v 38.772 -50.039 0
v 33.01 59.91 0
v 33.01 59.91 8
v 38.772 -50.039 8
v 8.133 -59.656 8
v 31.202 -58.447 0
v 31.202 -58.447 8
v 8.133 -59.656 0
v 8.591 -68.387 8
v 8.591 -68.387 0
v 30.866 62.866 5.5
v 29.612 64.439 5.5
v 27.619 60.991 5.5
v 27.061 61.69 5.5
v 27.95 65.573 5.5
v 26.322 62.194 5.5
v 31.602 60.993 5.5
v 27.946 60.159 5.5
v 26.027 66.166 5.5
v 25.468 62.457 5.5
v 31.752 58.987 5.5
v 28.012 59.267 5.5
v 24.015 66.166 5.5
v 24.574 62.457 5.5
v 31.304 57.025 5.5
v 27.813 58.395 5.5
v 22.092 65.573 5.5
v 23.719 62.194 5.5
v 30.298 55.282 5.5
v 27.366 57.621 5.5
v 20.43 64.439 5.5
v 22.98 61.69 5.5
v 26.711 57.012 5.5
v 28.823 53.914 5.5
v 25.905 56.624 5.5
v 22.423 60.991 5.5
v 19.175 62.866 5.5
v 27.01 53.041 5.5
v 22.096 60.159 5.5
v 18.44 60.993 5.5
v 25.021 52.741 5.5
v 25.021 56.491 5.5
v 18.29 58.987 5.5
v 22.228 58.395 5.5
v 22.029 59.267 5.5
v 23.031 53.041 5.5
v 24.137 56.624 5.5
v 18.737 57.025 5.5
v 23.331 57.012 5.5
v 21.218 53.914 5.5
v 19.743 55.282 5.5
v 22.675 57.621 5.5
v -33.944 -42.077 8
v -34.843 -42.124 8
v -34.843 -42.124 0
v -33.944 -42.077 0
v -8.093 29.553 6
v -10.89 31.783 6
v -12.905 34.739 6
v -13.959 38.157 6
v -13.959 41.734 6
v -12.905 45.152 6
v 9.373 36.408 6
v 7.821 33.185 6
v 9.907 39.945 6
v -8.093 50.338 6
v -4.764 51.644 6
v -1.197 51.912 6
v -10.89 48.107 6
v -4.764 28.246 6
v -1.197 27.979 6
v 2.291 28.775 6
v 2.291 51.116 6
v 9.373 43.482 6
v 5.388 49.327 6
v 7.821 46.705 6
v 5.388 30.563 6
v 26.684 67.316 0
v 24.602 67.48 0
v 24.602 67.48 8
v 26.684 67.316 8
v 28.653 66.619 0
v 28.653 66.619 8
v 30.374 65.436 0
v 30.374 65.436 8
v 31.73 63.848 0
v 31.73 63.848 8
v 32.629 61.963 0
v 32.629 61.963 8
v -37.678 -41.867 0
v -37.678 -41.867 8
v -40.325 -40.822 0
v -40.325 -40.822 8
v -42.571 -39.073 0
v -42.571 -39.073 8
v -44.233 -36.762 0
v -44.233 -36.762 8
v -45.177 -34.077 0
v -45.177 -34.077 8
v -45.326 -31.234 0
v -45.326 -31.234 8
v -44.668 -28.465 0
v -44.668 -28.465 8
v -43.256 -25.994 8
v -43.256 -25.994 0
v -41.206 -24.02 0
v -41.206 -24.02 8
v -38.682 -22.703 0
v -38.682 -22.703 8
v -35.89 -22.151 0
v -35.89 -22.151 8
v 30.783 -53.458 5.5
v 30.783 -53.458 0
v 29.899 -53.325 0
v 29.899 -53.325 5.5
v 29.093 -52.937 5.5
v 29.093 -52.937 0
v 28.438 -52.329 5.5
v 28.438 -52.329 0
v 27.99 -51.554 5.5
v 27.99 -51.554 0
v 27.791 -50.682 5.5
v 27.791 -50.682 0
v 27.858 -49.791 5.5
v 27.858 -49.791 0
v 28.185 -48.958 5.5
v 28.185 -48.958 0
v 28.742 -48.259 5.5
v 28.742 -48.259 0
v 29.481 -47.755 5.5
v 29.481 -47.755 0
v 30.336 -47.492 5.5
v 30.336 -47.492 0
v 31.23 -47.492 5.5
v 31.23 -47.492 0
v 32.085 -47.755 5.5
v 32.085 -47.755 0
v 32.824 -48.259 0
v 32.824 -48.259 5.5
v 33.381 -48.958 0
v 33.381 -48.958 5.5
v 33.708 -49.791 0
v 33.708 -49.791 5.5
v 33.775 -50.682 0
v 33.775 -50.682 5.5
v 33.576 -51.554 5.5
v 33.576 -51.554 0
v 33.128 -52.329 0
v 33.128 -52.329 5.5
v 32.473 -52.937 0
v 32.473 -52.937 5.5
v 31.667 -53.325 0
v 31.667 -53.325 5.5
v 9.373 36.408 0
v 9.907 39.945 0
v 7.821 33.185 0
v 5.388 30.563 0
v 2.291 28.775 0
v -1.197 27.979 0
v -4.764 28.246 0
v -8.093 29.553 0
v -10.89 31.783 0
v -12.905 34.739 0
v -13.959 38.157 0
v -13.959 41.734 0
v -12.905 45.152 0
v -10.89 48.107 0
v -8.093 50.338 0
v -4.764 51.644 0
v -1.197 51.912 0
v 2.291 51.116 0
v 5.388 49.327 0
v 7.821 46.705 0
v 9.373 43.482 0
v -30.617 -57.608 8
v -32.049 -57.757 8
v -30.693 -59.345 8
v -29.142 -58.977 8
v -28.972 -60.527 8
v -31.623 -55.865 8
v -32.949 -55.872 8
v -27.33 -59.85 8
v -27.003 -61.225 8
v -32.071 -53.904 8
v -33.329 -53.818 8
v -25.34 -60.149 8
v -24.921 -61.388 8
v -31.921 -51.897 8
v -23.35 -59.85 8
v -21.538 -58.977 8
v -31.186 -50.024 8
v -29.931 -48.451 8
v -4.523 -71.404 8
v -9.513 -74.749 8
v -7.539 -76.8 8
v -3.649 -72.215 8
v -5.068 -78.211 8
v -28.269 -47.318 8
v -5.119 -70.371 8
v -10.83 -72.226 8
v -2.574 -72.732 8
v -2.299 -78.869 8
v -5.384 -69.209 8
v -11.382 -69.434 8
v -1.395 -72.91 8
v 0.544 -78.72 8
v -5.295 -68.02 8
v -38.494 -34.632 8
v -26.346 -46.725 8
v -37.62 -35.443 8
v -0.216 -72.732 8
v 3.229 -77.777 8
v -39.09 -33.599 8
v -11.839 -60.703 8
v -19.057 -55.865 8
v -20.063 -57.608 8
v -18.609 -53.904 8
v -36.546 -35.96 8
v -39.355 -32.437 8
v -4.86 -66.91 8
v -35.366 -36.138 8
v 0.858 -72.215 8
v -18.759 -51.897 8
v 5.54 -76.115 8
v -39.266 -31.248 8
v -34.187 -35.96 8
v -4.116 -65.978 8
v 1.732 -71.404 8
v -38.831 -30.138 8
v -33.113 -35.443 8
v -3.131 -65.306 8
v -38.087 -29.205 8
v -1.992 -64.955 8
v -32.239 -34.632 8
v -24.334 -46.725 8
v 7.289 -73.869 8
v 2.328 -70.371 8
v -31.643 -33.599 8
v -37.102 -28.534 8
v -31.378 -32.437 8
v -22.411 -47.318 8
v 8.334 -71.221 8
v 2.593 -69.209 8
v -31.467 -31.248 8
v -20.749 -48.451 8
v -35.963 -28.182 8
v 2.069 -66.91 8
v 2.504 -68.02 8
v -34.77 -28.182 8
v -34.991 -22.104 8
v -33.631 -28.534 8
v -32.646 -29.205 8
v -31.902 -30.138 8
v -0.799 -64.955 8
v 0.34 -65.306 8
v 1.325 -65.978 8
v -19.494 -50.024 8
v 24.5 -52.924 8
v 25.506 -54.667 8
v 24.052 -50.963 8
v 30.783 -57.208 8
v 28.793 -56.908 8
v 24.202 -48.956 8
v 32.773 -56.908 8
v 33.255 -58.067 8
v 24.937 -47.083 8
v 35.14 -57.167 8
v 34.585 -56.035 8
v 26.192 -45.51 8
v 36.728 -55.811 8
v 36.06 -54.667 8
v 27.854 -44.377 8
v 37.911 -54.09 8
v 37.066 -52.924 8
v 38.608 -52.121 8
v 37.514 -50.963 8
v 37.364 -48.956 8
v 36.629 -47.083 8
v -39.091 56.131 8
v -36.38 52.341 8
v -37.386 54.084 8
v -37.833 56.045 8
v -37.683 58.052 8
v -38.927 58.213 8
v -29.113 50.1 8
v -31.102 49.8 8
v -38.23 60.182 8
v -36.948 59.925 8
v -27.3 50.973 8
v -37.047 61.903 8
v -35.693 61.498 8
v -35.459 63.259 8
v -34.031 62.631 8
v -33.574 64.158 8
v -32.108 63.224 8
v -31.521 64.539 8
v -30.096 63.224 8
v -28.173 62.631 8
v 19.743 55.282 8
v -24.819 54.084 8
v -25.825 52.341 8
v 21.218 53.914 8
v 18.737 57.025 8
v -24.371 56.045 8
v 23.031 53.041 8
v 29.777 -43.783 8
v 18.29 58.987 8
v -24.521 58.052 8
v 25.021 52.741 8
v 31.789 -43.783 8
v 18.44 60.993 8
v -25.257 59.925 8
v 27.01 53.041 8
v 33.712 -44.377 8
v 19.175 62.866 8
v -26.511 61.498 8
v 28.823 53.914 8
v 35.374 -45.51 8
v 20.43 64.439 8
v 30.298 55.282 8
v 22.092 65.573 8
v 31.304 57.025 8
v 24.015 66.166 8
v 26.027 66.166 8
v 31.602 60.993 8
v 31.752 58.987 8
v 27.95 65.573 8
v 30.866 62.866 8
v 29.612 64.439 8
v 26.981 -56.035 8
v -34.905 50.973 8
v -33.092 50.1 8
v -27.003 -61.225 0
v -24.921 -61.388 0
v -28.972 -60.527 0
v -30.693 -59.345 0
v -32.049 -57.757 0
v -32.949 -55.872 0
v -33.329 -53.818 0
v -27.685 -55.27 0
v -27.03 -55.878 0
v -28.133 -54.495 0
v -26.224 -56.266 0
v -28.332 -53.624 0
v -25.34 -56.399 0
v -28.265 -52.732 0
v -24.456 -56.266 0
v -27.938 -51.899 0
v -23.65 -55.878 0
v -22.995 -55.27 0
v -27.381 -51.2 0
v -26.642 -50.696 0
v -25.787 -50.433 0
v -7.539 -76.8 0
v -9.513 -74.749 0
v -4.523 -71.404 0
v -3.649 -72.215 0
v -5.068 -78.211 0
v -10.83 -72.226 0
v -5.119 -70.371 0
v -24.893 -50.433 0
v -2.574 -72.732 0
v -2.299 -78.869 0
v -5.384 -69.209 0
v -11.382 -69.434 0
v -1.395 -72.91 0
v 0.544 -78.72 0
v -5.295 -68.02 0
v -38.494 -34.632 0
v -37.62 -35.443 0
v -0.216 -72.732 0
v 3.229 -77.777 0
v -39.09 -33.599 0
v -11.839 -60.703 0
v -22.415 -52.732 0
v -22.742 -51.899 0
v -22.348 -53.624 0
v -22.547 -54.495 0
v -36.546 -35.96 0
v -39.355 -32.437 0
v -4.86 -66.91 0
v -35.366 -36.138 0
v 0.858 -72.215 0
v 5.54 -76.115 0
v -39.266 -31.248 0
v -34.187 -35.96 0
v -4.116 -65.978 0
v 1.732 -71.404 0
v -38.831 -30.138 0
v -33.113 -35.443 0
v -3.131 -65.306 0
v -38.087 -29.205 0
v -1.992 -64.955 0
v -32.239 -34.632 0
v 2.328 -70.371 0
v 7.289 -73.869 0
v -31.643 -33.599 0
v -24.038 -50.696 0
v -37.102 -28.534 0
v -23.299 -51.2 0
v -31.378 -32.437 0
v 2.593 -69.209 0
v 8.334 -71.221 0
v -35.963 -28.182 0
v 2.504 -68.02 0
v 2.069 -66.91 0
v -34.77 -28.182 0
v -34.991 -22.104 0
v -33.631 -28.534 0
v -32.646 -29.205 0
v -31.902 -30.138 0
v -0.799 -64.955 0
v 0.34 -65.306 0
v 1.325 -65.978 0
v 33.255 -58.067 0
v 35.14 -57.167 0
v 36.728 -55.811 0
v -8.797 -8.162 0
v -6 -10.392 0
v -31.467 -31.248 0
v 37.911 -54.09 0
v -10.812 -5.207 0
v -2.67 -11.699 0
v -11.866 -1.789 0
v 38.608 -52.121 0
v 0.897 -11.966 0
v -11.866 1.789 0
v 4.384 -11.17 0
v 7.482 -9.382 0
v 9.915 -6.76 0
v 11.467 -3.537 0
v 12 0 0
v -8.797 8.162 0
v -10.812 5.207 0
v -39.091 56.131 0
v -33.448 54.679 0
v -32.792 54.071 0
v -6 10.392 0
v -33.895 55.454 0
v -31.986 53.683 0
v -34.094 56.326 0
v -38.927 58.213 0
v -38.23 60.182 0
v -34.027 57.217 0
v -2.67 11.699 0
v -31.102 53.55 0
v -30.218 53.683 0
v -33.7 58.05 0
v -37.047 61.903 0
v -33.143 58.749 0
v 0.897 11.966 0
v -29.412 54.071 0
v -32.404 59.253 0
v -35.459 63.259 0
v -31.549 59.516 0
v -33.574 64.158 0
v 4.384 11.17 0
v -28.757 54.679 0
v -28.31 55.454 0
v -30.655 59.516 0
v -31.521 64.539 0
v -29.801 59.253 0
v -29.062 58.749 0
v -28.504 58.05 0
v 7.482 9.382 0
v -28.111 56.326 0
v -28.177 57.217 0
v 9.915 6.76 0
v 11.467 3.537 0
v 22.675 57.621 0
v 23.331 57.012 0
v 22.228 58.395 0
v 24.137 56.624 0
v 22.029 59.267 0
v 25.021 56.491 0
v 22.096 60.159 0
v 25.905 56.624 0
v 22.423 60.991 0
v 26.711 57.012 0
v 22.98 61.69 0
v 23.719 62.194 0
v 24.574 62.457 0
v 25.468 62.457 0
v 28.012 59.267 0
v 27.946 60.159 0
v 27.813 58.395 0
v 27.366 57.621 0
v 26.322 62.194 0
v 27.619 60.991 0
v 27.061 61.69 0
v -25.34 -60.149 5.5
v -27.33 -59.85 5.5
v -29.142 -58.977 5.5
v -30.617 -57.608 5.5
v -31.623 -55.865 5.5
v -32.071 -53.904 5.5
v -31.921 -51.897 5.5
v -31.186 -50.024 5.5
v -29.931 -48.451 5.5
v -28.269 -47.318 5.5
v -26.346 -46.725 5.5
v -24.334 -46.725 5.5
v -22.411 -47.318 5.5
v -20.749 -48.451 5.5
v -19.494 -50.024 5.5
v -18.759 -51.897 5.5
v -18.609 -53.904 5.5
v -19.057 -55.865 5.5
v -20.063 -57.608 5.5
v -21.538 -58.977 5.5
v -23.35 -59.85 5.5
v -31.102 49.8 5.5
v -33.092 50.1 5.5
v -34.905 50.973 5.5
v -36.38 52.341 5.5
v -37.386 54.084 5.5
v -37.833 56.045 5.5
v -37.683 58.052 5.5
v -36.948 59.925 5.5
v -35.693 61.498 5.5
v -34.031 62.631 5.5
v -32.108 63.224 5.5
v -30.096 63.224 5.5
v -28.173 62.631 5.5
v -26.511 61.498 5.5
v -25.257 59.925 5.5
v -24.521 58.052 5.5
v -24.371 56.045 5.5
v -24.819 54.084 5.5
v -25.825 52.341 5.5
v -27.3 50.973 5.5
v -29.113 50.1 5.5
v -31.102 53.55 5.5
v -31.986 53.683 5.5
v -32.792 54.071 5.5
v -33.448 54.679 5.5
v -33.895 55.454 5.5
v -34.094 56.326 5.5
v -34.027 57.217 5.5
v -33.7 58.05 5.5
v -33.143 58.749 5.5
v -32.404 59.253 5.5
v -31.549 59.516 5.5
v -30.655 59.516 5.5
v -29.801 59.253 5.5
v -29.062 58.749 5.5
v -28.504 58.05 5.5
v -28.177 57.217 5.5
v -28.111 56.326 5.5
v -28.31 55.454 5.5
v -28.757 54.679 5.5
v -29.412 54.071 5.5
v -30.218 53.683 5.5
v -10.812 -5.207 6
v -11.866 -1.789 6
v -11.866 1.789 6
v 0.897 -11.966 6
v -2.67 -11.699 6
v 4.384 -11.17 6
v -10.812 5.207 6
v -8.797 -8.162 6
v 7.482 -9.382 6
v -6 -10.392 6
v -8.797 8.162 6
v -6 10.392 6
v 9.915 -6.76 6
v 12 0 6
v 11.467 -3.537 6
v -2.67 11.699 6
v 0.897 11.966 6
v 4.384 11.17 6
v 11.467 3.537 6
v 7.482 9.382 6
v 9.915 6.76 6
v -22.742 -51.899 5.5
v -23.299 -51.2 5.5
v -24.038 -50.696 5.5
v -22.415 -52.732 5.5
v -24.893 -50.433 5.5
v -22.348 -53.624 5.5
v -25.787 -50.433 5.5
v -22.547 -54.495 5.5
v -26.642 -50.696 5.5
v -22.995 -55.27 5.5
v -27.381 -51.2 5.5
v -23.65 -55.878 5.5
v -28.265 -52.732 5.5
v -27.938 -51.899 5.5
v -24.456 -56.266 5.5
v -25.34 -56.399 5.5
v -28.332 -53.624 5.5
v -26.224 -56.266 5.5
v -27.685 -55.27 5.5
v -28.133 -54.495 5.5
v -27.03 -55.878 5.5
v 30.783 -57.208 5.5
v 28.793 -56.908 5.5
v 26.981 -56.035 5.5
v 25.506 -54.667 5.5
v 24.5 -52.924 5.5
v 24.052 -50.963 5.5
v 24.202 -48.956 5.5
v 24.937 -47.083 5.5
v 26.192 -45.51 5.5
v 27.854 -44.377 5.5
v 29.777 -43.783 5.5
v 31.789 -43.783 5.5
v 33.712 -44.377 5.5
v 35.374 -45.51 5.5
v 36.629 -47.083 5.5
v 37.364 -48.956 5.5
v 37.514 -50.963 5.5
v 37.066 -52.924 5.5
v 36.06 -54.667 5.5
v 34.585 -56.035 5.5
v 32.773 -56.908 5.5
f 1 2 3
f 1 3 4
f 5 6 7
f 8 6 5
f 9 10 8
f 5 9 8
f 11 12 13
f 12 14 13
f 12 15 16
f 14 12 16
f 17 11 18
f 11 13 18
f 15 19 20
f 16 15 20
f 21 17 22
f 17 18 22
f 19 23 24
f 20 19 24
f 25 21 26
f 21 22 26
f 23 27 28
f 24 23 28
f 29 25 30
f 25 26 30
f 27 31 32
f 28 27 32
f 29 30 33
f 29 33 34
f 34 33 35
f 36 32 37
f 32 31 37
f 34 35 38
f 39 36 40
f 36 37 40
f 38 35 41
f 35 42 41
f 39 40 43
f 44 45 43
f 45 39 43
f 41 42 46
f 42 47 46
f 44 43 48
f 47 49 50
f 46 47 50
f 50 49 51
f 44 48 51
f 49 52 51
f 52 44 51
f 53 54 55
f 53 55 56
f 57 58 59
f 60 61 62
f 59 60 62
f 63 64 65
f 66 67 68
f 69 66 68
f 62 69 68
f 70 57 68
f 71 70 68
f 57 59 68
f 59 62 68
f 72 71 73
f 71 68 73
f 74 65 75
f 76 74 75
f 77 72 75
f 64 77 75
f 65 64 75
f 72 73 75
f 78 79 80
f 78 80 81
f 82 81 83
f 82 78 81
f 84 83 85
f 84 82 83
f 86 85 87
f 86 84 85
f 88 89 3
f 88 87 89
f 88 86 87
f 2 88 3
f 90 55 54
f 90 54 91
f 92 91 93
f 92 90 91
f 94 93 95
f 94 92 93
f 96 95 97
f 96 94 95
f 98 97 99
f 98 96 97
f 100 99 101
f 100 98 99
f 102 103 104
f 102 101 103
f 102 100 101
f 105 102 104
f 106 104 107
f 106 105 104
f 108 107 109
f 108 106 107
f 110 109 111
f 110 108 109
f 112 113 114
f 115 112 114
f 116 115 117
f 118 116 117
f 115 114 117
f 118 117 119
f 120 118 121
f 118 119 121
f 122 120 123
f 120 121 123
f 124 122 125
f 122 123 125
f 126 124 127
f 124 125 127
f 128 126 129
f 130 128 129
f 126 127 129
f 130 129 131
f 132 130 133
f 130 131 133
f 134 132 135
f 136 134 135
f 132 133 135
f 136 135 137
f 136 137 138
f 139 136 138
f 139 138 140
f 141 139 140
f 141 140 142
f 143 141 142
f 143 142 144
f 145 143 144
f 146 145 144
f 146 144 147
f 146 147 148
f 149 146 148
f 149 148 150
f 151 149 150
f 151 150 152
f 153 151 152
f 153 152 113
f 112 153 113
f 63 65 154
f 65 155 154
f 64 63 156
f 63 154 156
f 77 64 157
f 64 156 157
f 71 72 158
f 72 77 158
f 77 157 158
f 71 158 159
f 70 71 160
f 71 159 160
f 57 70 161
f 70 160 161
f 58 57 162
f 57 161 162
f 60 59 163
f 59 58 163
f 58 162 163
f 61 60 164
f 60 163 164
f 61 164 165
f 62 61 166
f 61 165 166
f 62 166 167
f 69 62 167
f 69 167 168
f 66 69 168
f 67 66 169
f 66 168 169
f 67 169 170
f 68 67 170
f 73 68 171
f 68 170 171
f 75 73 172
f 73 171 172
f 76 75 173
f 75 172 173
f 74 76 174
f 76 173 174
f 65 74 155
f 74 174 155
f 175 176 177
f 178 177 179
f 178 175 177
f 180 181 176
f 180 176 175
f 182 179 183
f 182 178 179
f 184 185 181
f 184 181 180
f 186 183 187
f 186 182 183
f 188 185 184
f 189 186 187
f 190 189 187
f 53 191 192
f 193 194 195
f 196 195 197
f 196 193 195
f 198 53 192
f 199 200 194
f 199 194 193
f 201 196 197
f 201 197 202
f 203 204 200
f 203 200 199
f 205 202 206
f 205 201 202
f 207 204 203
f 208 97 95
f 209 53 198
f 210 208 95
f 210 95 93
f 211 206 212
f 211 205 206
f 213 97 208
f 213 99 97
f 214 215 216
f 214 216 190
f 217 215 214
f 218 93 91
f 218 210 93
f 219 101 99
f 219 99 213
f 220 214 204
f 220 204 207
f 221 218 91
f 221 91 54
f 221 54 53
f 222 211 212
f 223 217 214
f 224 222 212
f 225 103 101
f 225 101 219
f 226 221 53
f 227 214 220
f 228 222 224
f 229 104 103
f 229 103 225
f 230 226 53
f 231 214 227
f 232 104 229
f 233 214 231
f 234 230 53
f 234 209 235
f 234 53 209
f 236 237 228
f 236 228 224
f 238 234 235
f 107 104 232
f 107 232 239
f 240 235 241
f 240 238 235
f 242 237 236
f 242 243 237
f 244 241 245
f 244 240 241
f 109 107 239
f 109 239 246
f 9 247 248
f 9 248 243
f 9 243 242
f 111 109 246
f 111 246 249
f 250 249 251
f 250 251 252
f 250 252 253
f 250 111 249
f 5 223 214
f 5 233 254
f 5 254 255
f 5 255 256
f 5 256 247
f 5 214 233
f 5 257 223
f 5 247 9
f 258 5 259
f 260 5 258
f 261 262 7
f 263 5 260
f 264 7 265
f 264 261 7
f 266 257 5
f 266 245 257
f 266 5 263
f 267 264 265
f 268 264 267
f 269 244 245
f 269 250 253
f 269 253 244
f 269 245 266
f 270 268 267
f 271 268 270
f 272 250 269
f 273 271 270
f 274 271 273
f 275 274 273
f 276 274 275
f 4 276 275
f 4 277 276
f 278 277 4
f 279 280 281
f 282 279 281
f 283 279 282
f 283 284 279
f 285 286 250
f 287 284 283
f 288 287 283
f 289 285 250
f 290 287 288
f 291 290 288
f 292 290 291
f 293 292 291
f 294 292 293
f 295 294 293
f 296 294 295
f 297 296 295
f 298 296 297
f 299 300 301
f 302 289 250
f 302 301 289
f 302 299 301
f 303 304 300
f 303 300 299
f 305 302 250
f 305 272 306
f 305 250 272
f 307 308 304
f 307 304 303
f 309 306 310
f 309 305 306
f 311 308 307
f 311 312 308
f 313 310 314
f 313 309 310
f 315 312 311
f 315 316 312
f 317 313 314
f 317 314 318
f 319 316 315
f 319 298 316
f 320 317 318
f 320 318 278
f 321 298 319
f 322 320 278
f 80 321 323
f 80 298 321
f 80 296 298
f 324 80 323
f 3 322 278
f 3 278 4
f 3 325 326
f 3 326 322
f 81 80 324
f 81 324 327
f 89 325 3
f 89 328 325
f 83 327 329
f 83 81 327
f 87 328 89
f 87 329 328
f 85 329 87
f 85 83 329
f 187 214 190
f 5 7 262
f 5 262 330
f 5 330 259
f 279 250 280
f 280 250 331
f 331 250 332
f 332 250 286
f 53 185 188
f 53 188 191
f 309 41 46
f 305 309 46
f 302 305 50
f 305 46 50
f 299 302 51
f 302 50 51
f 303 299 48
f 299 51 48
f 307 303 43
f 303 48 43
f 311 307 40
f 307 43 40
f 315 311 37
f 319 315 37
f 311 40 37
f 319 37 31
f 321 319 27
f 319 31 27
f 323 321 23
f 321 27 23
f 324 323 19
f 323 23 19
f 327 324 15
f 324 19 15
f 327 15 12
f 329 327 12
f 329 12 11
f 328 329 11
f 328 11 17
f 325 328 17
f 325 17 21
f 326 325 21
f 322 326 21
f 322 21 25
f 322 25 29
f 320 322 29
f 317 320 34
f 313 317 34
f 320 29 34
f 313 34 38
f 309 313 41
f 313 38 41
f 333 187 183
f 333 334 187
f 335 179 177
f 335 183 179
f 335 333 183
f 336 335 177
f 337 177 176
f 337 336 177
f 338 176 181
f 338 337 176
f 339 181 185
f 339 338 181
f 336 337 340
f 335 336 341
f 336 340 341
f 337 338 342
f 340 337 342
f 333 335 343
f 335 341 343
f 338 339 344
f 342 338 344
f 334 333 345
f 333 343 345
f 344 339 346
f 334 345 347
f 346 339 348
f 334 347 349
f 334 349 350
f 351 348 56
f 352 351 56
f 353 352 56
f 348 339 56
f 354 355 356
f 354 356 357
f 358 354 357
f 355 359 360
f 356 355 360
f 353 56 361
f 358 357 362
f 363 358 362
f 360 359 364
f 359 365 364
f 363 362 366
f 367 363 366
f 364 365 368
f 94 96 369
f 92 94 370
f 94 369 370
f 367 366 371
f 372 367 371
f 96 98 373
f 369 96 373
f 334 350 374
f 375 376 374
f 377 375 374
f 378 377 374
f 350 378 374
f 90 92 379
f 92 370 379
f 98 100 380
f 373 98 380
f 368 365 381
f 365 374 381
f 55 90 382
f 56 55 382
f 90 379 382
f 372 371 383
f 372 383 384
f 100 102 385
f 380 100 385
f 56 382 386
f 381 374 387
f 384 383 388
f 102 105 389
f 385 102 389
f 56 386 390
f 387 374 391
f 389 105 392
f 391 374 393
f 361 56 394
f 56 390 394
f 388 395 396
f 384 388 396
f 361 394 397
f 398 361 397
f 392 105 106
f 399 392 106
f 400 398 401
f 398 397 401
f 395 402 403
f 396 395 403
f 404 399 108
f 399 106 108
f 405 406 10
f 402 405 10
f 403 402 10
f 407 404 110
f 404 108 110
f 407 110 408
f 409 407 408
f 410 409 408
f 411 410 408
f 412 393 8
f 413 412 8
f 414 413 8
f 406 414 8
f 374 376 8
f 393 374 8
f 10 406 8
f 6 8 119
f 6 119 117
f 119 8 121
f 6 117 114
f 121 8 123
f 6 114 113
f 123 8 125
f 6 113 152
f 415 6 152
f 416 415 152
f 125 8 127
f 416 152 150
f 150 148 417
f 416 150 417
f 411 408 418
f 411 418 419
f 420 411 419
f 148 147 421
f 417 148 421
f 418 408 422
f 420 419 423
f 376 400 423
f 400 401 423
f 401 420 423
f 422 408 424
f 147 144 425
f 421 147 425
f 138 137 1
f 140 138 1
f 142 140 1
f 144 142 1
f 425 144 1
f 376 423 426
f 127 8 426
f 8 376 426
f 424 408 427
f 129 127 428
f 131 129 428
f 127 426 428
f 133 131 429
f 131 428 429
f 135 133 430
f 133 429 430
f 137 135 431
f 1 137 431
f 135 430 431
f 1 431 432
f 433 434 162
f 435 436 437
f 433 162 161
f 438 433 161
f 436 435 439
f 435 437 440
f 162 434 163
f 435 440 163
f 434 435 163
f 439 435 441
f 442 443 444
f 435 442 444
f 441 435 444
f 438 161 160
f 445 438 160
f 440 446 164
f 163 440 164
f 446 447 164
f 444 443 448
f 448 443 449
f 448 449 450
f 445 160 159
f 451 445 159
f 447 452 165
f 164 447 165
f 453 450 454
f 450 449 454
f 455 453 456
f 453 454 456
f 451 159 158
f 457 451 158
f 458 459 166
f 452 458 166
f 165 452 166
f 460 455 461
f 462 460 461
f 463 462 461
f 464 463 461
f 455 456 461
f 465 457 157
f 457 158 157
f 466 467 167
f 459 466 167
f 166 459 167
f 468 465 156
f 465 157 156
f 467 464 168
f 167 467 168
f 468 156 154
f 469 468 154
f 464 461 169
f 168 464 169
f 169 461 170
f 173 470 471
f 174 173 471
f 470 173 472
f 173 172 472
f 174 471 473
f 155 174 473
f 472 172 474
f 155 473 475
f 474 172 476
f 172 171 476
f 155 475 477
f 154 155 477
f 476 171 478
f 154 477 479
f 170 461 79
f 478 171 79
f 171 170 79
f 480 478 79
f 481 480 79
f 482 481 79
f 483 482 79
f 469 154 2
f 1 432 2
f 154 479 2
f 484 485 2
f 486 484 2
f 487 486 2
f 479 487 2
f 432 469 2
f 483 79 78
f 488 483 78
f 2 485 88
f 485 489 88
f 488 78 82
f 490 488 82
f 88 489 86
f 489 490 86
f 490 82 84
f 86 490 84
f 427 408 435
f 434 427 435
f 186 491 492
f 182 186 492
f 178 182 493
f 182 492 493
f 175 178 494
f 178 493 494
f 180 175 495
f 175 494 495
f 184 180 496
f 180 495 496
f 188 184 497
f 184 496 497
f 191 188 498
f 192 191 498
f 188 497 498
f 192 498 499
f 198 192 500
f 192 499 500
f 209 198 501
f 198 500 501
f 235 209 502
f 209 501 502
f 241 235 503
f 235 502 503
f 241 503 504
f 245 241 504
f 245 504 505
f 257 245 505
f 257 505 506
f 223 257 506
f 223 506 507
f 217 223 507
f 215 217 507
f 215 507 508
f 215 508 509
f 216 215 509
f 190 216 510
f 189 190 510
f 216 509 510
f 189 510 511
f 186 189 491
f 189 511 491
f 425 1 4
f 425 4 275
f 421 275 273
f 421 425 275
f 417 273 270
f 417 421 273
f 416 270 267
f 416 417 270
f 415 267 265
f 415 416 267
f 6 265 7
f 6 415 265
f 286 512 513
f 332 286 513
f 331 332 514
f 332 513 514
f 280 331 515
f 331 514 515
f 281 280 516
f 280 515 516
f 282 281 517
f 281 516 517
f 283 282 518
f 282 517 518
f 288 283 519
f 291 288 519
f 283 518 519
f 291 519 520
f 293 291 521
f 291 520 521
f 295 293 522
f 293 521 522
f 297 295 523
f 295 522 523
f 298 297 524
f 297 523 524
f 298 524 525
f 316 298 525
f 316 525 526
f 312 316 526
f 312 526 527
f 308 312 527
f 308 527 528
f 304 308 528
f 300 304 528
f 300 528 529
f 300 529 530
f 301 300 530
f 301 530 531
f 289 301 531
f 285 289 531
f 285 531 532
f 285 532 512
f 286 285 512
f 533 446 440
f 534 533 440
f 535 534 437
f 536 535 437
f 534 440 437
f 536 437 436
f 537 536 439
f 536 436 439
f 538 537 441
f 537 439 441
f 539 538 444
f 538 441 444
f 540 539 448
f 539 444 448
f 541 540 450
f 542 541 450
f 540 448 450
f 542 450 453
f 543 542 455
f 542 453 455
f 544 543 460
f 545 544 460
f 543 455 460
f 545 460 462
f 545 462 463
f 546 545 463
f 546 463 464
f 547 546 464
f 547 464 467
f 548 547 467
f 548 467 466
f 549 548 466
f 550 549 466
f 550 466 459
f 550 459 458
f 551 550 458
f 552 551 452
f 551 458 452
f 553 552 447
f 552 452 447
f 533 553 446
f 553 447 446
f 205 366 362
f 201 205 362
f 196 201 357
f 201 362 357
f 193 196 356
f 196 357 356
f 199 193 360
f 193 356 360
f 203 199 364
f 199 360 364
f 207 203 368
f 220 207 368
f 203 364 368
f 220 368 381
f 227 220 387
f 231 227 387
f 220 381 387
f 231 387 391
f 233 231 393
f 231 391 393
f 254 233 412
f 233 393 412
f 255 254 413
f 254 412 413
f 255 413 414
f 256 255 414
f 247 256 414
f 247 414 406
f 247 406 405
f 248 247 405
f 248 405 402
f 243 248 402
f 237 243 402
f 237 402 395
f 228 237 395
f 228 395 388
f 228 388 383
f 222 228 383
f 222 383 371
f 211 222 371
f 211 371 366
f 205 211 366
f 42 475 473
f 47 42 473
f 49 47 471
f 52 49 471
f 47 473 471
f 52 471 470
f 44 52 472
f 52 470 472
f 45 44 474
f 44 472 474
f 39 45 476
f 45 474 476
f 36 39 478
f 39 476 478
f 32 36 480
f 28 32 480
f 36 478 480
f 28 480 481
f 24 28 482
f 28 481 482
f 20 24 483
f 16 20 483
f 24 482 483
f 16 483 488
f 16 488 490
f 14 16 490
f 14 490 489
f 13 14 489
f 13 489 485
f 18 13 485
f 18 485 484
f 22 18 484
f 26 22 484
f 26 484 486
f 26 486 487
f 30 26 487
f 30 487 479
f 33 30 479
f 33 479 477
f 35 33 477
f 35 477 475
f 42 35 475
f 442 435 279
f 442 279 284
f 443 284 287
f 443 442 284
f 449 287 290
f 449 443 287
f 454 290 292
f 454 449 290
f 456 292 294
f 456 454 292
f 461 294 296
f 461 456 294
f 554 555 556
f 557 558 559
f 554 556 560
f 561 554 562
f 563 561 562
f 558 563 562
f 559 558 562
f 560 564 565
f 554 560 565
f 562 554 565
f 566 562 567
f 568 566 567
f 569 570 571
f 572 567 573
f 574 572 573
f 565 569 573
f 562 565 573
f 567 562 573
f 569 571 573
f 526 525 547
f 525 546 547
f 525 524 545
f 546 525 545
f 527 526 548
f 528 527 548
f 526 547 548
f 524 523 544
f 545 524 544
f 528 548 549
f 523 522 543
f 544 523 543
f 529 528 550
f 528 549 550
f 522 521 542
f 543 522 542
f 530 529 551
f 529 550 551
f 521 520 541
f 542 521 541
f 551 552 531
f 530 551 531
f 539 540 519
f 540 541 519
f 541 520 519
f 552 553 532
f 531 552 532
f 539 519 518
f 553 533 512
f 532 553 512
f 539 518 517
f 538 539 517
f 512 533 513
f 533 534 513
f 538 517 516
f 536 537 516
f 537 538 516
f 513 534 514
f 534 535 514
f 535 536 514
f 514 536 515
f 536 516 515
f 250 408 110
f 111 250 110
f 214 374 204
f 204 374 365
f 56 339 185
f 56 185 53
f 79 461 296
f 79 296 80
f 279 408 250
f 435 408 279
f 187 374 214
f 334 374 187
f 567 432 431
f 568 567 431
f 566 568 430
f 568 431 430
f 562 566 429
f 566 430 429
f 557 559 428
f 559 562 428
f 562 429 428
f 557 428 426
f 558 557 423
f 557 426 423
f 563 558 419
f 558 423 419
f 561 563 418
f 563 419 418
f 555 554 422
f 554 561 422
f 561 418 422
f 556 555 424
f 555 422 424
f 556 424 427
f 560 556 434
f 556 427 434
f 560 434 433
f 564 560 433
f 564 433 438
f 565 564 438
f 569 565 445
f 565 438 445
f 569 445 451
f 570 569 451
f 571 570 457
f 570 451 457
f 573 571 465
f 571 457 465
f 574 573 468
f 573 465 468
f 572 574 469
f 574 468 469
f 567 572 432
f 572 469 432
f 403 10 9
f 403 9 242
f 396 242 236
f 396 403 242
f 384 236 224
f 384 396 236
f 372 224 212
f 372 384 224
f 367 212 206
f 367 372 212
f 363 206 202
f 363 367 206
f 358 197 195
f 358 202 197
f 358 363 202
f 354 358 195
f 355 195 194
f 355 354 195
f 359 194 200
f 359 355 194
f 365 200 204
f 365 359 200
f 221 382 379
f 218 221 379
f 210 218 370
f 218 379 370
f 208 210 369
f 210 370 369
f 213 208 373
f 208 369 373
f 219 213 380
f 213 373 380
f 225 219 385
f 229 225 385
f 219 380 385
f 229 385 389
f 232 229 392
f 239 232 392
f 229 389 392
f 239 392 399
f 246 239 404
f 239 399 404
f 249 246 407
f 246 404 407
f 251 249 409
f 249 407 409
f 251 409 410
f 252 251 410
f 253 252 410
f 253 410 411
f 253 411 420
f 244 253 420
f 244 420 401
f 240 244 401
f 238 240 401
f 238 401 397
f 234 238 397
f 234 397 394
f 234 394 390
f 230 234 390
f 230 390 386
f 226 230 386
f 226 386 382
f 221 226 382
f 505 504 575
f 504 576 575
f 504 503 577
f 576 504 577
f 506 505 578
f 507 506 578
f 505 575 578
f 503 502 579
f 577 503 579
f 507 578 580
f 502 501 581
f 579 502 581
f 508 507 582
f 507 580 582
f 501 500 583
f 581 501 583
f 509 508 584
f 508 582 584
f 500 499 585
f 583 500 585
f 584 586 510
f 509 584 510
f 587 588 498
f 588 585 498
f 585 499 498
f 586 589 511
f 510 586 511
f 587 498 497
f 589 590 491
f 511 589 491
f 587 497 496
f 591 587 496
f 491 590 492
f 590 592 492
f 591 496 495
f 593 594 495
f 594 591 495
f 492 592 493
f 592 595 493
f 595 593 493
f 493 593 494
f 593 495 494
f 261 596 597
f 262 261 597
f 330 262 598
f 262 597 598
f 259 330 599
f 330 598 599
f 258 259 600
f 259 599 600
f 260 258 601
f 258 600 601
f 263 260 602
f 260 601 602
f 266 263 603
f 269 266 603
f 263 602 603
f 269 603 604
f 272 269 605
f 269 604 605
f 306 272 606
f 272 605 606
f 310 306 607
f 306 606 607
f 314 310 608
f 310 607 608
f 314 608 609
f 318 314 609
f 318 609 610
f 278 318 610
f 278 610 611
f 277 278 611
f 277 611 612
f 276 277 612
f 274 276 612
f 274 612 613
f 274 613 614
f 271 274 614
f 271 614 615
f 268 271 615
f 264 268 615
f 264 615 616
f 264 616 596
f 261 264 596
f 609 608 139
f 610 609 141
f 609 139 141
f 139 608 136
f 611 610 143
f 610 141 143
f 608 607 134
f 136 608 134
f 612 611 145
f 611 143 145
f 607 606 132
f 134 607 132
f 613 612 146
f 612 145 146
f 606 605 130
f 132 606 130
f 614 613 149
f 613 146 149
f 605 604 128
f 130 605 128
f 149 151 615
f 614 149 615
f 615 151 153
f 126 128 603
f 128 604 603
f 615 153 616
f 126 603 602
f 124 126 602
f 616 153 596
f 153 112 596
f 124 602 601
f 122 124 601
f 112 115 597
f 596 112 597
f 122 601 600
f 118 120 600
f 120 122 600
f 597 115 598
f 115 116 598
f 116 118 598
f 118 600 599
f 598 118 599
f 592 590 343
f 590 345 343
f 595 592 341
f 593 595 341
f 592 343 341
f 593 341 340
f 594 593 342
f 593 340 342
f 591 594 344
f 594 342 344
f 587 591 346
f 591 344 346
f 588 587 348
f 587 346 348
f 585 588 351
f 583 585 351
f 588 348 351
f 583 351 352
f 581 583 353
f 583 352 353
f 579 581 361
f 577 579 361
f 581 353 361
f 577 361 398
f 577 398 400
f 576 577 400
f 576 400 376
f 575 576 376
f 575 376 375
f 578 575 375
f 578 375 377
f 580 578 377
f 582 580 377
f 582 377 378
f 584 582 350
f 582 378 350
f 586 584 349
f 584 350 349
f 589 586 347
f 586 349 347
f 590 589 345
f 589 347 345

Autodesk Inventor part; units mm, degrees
ref_plane "YZ Plane" through (0, 0, 0) normal (1, 0, 0) x (0, 1, 0)
ref_plane "XZ Plane" through (0, 0, 0) normal (0, 1, 0) x (-1, 0, 0)
ref_plane "XY Plane" through (0, 0, 0) normal (0, 0, 1) x (1, 0, 0)
sketch "Эскиз1" plane through (0, 0, 0) normal (0, 0, 1) x (1, 0, 0)
  arc A0 (31.2016, -58.4471) -> (38.772, -50.0394) centre (30.783, -50.4581) ccw projected
  line L0 (31.2016, -58.4471) -> (8.1333, -59.6561) projected
  line L1 (33.0098, 59.9097) -> (38.772, -50.0394) projected
  arc A1 (33.0098, 59.9097) -> (24.6021, 67.4801) centre (25.0208, 59.491) ccw projected
  circle A2 centre (-2.0934, 39.9452) radius 12 projected
  circle A3 centre (0, 0) radius 12 projected
  line L2 (-34.9911, -22.1042) -> (-39.0912, 56.131) projected
  arc A4 (-35.8899, -22.1513) -> (-34.8432, -42.1239) centre (-35.3665, -32.1376) ccw projected
  line L3 (-34.9911, -22.1042) -> (-35.8899, -22.1513) projected
  line L4 (-34.8432, -42.1239) -> (-33.9444, -42.0768) projected
  line L5 (-33.3291, -53.8181) -> (-33.9444, -42.0768) projected
  arc A5 (-33.3291, -53.8181) -> (-24.9213, -61.3884) centre (-25.34, -53.3994) ccw projected
  line L6 (-11.8393, -60.7028) -> (-24.9213, -61.3884) projected
  arc A6 (-31.5209, 64.5388) -> (-39.0912, 56.131) centre (-31.1022, 56.5497) ccw projected
  line L7 (-31.5209, 64.5388) -> (24.6021, 67.4801) projected
  arc A7 (-11.3817, -69.4335) -> (8.5909, -68.3868) centre (-1.3954, -68.9101) ccw projected
  line L8 (-11.8393, -60.7028) -> (-11.3817, -69.4335) projected
  line L9 (8.5909, -68.3868) -> (8.1333, -59.6561) projected
  point P0 (24.6021, 67.4801)
  point P1 (26.2085, -58.7088)
extrude "Выдавливание1" add sketch "Эскиз1" along normal blind 6
sketch "Эскиз2" plane through (0, 0, 6) normal (0, 0, 1) x (1, 0, 0)
  line L0 (38.772, -50.0394) -> (33.0098, 59.9097) projected
  line L1 (8.1333, -59.6561) -> (31.2016, -58.4471) projected
  arc A0 (31.2016, -58.4471) -> (38.772, -50.0394) centre (30.783, -50.4581) ccw projected
  arc A1 (-33.3291, -53.8181) -> (-24.9213, -61.3884) centre (-25.34, -53.3994) ccw projected
  line L2 (-33.9444, -42.0768) -> (-33.3291, -53.8181) projected
  line L3 (-34.8432, -42.1239) -> (-33.9444, -42.0768) projected
  arc A2 (-35.8899, -22.1513) -> (-34.8432, -42.1239) centre (-35.3665, -32.1376) ccw projected
  line L4 (-39.0912, 56.131) -> (-34.9911, -22.1042) projected
  line L5 (-34.9911, -22.1042) -> (-35.8899, -22.1513) projected
  arc A3 (-31.5209, 64.5388) -> (-39.0912, 56.131) centre (-31.1022, 56.5497) ccw projected
  line L6 (24.6021, 67.4801) -> (-31.5209, 64.5388) projected
  arc A4 (33.0098, 59.9097) -> (24.6021, 67.4801) centre (25.0208, 59.491) ccw projected
  arc A5 (-11.3817, -69.4335) -> (8.5909, -68.3868) centre (-1.3954, -68.9101) ccw projected
  line L7 (-11.8393, -60.7028) -> (-11.3817, -69.4335) projected
  line L8 (-24.9213, -61.3884) -> (-11.8393, -60.7028) projected
  line L9 (8.5909, -68.3868) -> (8.1333, -59.6561) projected
  point P0 (0, 0)
extrude "Выдавливание2" add sketch "Эскиз2" along normal blind 2
sketch "Эскиз3" plane through (0, 0, 8) normal (0, 0, 1) x (1, 0, 0)
  circle A0 centre (25.0208, 59.491) radius 3 construction
  circle A1 centre (-31.1022, 56.5497) radius 3 construction
  circle A2 centre (30.783, -50.4581) radius 3 construction
  circle A3 centre (-25.34, -53.3994) radius 3 construction
  point P0 (0, 0)
hole "Отверстие1" at (-25.34, -53.3994, 8) at (30.783, -50.4581, 8) at (-31.1022, 56.5497, 8) at (25.0208, 59.491, 8) direction (0, 0, -1) diameter 6 end through all counterbore diameter 13.5 counterbore depth 2.5 clearance for "болты с шестигранной головкой / гайка ГОСТ 12876-67" size "M6" standard "ГОСТ"
sketch "Эскиз4" plane through (0, 0, 8) normal (0, 0, 1) x (1, 0, 0)
  circle A0 centre (-1.3954, -68.9101) radius 4 construction
  circle A1 centre (-35.3665, -32.1376) radius 4 construction
  point P0 (0, 0)
hole "Отверстие2" at (-1.3954, -68.9101, 8) at (-35.3665, -32.1376, 8) direction (0, 0, -1) diameter 8 end through all clearance for "с потайной головкой ГОСТ 12876-67" size "M8" standard "ГОСТ"
properties part number "Пластина 2"
